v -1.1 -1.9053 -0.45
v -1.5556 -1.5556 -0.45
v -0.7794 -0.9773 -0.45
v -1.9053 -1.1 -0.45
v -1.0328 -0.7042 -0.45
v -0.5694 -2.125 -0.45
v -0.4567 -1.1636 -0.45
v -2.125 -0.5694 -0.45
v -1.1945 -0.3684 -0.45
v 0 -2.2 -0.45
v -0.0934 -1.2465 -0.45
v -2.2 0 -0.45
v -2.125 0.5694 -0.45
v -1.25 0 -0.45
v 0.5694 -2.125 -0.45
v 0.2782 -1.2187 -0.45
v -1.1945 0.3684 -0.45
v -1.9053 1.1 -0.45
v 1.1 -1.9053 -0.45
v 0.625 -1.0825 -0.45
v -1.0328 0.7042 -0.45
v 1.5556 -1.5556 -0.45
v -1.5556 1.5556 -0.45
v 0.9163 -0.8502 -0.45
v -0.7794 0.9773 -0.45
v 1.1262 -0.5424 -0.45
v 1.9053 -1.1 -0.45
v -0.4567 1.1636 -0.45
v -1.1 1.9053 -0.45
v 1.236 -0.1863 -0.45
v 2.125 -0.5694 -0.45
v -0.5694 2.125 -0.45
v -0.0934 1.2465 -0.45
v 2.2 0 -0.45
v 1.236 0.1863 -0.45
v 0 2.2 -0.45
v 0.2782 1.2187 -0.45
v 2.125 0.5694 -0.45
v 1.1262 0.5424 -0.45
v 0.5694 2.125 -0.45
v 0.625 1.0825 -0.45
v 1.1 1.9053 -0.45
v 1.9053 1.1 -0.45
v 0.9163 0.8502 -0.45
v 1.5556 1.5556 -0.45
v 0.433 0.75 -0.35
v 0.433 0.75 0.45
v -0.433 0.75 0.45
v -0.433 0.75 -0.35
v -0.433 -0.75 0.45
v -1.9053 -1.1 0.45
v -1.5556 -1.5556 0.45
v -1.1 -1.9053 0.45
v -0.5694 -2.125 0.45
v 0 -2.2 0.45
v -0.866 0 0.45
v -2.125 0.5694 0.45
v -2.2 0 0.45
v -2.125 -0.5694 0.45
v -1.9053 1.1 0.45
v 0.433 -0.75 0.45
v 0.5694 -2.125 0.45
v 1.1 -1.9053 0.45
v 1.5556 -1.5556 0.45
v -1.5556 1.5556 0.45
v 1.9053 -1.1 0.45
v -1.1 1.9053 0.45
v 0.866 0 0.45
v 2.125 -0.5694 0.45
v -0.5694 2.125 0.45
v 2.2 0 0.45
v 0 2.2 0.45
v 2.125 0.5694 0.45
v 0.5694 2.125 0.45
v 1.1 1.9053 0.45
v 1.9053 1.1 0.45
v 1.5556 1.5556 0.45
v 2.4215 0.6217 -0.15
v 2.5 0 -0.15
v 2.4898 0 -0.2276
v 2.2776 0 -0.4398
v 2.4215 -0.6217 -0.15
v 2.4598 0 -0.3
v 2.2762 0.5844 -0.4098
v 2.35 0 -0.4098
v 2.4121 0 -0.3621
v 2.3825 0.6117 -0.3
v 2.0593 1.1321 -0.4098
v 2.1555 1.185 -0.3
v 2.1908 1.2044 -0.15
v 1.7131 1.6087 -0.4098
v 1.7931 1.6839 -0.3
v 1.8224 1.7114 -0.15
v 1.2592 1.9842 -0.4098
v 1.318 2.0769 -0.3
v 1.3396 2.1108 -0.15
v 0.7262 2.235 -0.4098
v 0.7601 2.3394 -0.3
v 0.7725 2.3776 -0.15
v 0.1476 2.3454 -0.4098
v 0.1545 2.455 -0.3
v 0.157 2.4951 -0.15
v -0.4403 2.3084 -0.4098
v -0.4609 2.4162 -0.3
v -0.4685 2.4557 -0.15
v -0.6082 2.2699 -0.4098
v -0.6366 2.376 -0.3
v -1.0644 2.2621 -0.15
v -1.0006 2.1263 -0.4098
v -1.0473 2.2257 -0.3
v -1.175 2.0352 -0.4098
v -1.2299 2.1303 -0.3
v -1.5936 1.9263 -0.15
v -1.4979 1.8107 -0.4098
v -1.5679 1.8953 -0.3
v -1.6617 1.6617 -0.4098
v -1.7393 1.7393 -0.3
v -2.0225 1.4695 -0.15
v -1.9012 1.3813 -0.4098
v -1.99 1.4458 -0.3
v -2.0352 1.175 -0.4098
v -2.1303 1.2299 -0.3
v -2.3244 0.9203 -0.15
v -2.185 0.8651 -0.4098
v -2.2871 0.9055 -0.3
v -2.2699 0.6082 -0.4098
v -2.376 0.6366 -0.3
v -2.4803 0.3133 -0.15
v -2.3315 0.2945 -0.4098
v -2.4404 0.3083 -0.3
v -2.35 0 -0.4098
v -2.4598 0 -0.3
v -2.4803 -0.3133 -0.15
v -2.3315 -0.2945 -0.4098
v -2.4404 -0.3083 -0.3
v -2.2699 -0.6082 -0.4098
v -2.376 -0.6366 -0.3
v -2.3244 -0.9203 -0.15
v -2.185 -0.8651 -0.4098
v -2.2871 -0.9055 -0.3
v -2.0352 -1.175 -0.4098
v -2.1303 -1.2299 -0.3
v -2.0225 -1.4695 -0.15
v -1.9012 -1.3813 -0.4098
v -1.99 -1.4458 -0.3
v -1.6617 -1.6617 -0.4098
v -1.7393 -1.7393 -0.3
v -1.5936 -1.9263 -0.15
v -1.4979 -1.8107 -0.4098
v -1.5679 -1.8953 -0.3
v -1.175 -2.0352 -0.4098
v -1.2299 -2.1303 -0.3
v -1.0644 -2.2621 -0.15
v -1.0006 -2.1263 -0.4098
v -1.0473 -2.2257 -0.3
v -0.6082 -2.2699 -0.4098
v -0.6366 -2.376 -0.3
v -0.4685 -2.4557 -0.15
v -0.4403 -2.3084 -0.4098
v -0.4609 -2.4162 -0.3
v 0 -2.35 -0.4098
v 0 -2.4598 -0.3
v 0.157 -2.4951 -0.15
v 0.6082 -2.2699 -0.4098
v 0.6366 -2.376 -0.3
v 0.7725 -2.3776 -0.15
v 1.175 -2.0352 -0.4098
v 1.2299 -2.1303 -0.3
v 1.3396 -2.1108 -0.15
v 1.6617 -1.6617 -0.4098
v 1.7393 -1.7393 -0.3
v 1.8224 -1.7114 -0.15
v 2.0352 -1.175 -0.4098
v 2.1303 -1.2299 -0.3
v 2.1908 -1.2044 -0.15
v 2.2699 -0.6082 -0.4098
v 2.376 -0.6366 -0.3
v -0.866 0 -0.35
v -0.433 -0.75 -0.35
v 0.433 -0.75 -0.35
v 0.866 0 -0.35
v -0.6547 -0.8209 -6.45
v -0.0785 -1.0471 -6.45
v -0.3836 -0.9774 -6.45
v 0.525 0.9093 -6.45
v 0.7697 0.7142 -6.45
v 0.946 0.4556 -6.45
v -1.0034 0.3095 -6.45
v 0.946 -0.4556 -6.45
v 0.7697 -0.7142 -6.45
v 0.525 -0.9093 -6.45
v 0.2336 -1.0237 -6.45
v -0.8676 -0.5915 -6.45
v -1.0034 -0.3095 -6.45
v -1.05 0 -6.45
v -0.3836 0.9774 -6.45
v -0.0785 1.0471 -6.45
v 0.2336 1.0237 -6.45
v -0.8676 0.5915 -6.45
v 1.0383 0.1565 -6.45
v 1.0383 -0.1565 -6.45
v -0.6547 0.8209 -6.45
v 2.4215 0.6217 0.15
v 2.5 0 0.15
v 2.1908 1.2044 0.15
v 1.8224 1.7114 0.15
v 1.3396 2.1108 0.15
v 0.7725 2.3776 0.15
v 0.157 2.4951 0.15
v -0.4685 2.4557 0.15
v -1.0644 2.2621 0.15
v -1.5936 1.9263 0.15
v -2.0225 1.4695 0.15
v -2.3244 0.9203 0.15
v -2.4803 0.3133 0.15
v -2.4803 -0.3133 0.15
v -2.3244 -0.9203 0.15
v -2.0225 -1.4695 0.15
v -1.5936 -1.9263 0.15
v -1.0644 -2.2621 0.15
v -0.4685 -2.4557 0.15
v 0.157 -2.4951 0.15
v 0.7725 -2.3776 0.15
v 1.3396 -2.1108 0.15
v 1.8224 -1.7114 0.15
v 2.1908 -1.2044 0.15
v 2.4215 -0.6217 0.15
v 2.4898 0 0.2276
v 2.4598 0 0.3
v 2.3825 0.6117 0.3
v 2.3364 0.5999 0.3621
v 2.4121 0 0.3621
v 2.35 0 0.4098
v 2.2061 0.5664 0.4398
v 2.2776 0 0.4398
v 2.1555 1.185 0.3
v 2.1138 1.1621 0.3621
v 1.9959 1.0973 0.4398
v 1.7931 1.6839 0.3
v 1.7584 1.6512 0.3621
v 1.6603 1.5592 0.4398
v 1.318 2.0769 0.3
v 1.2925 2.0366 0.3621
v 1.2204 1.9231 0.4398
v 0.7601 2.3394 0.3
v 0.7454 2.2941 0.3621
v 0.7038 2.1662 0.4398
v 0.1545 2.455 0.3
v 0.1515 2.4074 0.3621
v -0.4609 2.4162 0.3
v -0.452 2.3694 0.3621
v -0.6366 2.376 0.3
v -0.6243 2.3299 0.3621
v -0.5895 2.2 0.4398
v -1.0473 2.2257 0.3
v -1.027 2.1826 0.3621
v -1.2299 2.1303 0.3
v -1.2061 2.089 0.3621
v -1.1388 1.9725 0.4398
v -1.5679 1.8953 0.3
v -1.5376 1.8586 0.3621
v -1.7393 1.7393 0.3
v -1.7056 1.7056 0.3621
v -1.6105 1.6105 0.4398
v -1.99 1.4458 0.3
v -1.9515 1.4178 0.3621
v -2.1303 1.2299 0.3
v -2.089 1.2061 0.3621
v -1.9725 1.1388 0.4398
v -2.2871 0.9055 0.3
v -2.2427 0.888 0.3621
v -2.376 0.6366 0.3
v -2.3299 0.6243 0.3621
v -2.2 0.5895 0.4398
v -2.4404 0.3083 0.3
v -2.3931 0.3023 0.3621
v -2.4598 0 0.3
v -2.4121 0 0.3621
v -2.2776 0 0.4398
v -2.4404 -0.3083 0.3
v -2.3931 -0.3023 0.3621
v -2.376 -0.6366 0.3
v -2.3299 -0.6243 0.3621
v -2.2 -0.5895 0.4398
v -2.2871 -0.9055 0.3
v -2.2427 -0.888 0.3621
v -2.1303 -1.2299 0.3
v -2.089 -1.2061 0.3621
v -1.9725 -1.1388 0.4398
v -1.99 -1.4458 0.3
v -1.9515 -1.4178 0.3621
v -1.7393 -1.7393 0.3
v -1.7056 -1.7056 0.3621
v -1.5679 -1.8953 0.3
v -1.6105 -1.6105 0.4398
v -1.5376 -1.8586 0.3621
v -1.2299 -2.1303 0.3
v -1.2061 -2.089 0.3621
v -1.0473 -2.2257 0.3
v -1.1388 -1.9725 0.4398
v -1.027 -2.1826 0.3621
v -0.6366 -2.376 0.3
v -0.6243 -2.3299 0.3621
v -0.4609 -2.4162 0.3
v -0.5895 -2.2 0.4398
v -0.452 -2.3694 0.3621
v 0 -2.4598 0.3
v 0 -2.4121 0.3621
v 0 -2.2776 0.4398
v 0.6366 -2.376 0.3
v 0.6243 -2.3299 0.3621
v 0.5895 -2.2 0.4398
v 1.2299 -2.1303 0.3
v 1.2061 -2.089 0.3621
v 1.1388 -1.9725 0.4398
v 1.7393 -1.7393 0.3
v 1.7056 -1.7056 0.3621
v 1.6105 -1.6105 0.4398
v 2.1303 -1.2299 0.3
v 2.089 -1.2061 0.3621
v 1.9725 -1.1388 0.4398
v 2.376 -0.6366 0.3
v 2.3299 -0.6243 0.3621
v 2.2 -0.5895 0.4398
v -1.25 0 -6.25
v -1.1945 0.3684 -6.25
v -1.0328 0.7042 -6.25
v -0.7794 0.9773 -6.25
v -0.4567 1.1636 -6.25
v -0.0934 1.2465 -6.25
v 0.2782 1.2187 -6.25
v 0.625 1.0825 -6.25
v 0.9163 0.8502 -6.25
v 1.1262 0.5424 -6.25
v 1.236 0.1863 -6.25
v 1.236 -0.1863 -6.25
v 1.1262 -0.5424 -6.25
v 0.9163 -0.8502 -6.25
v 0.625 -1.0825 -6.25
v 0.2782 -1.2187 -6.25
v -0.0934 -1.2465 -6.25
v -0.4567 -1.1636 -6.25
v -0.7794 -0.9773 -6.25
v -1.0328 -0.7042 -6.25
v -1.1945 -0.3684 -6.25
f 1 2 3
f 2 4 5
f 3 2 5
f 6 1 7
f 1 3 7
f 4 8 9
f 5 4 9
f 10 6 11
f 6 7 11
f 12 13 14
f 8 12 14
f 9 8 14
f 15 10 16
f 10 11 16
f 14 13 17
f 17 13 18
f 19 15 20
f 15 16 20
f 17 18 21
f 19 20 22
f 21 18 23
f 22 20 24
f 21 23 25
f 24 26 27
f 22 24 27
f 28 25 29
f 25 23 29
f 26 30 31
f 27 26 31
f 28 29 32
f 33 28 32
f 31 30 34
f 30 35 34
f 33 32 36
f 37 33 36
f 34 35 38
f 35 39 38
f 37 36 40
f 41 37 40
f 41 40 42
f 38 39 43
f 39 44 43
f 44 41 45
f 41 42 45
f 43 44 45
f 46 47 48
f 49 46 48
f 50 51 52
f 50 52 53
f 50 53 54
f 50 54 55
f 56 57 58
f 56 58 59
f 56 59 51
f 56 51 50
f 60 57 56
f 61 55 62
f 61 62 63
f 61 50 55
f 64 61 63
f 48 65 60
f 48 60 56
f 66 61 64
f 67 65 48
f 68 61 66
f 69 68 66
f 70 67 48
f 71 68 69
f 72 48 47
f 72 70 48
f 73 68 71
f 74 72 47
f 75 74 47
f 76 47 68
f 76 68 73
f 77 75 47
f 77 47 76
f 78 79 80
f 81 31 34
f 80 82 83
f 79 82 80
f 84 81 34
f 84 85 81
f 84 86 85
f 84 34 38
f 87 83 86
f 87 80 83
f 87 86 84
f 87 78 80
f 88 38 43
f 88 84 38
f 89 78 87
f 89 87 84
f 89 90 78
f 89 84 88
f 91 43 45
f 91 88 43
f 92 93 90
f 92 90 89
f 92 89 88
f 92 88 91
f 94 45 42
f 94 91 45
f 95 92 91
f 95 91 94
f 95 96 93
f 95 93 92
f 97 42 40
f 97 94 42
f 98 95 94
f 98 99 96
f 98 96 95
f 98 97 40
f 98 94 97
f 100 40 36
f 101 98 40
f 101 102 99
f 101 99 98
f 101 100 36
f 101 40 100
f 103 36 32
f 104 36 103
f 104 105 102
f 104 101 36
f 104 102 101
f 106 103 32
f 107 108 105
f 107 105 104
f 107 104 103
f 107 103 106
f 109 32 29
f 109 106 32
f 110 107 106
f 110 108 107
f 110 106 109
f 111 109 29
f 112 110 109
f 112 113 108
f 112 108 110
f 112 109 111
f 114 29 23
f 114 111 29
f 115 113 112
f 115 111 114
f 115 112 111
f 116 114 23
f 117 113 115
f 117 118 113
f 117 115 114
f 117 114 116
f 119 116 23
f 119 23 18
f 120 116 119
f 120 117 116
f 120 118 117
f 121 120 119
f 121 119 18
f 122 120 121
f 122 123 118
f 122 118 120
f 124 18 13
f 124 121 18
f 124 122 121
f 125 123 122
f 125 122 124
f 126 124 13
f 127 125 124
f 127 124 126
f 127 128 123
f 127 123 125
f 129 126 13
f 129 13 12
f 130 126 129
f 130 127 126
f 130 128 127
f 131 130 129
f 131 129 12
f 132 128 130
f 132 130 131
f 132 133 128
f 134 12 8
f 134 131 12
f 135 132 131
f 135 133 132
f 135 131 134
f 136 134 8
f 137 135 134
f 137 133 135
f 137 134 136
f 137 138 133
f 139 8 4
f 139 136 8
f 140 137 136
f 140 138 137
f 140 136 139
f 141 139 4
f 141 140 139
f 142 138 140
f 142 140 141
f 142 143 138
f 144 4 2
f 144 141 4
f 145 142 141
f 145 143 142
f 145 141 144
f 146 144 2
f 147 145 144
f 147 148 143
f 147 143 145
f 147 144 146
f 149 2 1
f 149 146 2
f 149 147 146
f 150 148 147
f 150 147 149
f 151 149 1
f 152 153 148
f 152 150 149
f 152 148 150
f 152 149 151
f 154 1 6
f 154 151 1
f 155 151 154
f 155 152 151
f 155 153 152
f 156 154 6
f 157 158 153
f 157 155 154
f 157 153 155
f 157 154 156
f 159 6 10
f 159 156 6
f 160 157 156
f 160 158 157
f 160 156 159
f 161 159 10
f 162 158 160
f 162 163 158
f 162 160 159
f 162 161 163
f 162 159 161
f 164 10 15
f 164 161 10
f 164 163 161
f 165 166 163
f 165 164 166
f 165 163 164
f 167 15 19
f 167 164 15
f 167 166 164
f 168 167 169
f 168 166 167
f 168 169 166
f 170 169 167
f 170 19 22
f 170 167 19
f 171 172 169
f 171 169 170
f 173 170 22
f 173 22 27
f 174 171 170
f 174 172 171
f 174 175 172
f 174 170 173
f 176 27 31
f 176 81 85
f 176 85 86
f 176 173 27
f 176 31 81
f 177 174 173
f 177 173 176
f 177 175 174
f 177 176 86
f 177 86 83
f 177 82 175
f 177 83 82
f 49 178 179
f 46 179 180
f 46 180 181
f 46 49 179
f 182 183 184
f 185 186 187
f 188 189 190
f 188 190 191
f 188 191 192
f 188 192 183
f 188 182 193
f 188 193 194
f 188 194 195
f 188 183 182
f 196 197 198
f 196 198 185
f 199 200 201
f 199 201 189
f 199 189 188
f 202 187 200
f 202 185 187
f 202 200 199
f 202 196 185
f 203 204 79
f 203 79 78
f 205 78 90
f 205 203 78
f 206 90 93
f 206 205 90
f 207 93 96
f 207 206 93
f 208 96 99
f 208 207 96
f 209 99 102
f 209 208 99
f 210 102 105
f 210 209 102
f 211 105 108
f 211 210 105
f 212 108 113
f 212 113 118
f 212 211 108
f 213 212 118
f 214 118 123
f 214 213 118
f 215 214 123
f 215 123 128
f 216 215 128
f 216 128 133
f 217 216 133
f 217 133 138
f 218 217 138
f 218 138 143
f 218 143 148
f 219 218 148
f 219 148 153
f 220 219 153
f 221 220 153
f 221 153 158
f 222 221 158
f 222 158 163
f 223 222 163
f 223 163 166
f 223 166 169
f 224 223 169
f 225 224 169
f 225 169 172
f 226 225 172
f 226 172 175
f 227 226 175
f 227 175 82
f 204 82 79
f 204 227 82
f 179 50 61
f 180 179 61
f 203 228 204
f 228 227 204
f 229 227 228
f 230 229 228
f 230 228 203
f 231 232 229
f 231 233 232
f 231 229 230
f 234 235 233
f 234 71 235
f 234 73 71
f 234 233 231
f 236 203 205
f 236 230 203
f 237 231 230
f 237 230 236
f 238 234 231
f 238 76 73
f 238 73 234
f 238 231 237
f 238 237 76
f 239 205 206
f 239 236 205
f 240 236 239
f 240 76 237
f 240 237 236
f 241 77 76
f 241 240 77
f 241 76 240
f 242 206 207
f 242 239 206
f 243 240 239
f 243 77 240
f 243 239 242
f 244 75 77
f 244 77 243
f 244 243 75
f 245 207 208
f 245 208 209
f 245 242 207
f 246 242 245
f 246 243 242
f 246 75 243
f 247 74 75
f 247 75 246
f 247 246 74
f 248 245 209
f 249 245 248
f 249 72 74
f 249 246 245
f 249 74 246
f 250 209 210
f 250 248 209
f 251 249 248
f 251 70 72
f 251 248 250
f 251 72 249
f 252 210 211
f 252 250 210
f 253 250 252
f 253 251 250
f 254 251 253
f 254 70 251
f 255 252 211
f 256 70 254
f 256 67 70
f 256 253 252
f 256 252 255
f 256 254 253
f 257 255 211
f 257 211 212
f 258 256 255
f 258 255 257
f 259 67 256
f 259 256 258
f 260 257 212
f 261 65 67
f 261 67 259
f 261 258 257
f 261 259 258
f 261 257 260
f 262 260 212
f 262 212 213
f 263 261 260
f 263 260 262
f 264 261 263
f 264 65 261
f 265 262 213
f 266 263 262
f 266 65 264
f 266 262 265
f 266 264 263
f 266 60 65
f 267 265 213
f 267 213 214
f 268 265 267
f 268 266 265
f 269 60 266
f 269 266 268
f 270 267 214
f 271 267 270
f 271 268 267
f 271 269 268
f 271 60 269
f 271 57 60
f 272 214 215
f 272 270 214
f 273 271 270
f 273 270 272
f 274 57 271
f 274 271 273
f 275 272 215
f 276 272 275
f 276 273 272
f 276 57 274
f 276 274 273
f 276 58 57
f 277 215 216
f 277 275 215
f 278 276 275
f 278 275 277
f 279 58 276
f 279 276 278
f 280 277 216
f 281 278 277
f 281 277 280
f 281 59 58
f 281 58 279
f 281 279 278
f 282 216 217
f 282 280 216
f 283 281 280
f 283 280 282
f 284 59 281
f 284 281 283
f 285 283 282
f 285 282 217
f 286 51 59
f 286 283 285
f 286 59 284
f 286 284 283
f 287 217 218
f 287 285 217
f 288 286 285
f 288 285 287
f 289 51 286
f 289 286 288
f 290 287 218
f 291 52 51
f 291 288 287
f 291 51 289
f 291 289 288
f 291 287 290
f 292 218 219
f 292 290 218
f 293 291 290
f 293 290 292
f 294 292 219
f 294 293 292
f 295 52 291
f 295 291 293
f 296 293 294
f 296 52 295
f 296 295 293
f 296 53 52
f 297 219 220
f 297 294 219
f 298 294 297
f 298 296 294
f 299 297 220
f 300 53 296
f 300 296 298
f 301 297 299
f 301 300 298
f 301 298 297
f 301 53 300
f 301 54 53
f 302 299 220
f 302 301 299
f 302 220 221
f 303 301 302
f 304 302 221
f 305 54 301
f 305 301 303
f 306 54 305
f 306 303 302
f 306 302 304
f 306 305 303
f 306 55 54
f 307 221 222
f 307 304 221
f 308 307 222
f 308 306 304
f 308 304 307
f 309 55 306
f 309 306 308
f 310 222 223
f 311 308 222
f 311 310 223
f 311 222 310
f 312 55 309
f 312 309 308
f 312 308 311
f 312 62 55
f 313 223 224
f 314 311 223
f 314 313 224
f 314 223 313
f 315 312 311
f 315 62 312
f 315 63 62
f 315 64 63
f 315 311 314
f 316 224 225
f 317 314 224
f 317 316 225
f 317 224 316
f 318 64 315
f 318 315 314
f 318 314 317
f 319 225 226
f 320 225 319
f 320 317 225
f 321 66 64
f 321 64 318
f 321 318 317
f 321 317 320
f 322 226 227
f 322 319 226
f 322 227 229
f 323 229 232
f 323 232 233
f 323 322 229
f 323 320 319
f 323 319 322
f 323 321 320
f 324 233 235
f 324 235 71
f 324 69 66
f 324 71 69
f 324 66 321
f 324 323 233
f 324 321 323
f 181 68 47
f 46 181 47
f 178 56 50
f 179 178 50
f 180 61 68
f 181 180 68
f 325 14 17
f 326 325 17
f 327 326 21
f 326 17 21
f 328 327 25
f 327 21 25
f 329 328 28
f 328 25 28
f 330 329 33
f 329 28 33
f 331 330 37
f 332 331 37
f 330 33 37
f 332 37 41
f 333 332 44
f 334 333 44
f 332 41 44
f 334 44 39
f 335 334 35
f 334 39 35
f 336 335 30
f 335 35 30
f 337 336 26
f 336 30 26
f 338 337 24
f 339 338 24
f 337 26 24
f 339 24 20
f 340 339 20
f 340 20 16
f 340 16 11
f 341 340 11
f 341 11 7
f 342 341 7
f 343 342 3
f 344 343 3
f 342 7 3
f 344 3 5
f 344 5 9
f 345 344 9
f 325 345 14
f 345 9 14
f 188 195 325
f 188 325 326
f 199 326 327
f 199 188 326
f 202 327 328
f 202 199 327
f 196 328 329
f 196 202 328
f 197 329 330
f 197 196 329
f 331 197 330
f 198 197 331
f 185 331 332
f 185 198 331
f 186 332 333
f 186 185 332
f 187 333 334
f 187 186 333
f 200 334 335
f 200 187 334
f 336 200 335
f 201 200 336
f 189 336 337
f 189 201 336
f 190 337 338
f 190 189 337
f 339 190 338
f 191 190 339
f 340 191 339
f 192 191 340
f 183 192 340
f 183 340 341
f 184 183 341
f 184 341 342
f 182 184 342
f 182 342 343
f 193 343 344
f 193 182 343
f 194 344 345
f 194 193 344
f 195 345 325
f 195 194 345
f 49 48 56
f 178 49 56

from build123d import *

# Parameters (mm, degrees)
SKETCH_1_R          = 2.5
EXTRUDE_1_DEPTH     = 0.45
SKETCH_2_R          = 1.25
EXTRUDE_2_DEPTH     = 6
CHAMFER_1_SIZE      = 0.2
CUT_EXTRUDE_1_DEPTH = 0.8
FILLET_2_R          = 0.3


with BuildPart() as part:
    # 草图1 → 凸台-拉伸1 (new body, symmetric)
    with BuildSketch(Plane.XY):
        Circle(SKETCH_1_R)
    extrude(amount=EXTRUDE_1_DEPTH, both=True)

    # 草图2 → 凸台-拉伸2 (add)
    with BuildSketch(Plane(origin=(0, 0, -0.45), x_dir=(-1, 0, 0), z_dir=(0, 0, -1))):
        Circle(SKETCH_2_R)
    extrude(amount=EXTRUDE_2_DEPTH)

    # 倒角1
    chamfer_1_edges = [part.edges().sort_by_distance(p)[0] for p in [
        (1.25, 0, -6.45),
    ]]
    chamfer(chamfer_1_edges, length=CHAMFER_1_SIZE)

    # 草图3 → 切除-拉伸1 (cut)
    with BuildSketch(Plane.XY.offset(0.45)):
        Polygon((0.866025404, 0), (0.433012702, 0.75), (-0.433012702, 0.75), (-0.866025404, 0), (-0.433012702, -0.75), (0.433012702, -0.75), align=None)
    extrude(amount=-CUT_EXTRUDE_1_DEPTH, mode=Mode.SUBTRACT)

    # 圆角2
    fillet_2_edges = [part.edges().sort_by_distance(p)[0] for p in [
        (-2.5, 0, -0.45),
        (-2.5, 0, 0.45),
    ]]
    fillet(fillet_2_edges, radius=FILLET_2_R)


solid = part.part
